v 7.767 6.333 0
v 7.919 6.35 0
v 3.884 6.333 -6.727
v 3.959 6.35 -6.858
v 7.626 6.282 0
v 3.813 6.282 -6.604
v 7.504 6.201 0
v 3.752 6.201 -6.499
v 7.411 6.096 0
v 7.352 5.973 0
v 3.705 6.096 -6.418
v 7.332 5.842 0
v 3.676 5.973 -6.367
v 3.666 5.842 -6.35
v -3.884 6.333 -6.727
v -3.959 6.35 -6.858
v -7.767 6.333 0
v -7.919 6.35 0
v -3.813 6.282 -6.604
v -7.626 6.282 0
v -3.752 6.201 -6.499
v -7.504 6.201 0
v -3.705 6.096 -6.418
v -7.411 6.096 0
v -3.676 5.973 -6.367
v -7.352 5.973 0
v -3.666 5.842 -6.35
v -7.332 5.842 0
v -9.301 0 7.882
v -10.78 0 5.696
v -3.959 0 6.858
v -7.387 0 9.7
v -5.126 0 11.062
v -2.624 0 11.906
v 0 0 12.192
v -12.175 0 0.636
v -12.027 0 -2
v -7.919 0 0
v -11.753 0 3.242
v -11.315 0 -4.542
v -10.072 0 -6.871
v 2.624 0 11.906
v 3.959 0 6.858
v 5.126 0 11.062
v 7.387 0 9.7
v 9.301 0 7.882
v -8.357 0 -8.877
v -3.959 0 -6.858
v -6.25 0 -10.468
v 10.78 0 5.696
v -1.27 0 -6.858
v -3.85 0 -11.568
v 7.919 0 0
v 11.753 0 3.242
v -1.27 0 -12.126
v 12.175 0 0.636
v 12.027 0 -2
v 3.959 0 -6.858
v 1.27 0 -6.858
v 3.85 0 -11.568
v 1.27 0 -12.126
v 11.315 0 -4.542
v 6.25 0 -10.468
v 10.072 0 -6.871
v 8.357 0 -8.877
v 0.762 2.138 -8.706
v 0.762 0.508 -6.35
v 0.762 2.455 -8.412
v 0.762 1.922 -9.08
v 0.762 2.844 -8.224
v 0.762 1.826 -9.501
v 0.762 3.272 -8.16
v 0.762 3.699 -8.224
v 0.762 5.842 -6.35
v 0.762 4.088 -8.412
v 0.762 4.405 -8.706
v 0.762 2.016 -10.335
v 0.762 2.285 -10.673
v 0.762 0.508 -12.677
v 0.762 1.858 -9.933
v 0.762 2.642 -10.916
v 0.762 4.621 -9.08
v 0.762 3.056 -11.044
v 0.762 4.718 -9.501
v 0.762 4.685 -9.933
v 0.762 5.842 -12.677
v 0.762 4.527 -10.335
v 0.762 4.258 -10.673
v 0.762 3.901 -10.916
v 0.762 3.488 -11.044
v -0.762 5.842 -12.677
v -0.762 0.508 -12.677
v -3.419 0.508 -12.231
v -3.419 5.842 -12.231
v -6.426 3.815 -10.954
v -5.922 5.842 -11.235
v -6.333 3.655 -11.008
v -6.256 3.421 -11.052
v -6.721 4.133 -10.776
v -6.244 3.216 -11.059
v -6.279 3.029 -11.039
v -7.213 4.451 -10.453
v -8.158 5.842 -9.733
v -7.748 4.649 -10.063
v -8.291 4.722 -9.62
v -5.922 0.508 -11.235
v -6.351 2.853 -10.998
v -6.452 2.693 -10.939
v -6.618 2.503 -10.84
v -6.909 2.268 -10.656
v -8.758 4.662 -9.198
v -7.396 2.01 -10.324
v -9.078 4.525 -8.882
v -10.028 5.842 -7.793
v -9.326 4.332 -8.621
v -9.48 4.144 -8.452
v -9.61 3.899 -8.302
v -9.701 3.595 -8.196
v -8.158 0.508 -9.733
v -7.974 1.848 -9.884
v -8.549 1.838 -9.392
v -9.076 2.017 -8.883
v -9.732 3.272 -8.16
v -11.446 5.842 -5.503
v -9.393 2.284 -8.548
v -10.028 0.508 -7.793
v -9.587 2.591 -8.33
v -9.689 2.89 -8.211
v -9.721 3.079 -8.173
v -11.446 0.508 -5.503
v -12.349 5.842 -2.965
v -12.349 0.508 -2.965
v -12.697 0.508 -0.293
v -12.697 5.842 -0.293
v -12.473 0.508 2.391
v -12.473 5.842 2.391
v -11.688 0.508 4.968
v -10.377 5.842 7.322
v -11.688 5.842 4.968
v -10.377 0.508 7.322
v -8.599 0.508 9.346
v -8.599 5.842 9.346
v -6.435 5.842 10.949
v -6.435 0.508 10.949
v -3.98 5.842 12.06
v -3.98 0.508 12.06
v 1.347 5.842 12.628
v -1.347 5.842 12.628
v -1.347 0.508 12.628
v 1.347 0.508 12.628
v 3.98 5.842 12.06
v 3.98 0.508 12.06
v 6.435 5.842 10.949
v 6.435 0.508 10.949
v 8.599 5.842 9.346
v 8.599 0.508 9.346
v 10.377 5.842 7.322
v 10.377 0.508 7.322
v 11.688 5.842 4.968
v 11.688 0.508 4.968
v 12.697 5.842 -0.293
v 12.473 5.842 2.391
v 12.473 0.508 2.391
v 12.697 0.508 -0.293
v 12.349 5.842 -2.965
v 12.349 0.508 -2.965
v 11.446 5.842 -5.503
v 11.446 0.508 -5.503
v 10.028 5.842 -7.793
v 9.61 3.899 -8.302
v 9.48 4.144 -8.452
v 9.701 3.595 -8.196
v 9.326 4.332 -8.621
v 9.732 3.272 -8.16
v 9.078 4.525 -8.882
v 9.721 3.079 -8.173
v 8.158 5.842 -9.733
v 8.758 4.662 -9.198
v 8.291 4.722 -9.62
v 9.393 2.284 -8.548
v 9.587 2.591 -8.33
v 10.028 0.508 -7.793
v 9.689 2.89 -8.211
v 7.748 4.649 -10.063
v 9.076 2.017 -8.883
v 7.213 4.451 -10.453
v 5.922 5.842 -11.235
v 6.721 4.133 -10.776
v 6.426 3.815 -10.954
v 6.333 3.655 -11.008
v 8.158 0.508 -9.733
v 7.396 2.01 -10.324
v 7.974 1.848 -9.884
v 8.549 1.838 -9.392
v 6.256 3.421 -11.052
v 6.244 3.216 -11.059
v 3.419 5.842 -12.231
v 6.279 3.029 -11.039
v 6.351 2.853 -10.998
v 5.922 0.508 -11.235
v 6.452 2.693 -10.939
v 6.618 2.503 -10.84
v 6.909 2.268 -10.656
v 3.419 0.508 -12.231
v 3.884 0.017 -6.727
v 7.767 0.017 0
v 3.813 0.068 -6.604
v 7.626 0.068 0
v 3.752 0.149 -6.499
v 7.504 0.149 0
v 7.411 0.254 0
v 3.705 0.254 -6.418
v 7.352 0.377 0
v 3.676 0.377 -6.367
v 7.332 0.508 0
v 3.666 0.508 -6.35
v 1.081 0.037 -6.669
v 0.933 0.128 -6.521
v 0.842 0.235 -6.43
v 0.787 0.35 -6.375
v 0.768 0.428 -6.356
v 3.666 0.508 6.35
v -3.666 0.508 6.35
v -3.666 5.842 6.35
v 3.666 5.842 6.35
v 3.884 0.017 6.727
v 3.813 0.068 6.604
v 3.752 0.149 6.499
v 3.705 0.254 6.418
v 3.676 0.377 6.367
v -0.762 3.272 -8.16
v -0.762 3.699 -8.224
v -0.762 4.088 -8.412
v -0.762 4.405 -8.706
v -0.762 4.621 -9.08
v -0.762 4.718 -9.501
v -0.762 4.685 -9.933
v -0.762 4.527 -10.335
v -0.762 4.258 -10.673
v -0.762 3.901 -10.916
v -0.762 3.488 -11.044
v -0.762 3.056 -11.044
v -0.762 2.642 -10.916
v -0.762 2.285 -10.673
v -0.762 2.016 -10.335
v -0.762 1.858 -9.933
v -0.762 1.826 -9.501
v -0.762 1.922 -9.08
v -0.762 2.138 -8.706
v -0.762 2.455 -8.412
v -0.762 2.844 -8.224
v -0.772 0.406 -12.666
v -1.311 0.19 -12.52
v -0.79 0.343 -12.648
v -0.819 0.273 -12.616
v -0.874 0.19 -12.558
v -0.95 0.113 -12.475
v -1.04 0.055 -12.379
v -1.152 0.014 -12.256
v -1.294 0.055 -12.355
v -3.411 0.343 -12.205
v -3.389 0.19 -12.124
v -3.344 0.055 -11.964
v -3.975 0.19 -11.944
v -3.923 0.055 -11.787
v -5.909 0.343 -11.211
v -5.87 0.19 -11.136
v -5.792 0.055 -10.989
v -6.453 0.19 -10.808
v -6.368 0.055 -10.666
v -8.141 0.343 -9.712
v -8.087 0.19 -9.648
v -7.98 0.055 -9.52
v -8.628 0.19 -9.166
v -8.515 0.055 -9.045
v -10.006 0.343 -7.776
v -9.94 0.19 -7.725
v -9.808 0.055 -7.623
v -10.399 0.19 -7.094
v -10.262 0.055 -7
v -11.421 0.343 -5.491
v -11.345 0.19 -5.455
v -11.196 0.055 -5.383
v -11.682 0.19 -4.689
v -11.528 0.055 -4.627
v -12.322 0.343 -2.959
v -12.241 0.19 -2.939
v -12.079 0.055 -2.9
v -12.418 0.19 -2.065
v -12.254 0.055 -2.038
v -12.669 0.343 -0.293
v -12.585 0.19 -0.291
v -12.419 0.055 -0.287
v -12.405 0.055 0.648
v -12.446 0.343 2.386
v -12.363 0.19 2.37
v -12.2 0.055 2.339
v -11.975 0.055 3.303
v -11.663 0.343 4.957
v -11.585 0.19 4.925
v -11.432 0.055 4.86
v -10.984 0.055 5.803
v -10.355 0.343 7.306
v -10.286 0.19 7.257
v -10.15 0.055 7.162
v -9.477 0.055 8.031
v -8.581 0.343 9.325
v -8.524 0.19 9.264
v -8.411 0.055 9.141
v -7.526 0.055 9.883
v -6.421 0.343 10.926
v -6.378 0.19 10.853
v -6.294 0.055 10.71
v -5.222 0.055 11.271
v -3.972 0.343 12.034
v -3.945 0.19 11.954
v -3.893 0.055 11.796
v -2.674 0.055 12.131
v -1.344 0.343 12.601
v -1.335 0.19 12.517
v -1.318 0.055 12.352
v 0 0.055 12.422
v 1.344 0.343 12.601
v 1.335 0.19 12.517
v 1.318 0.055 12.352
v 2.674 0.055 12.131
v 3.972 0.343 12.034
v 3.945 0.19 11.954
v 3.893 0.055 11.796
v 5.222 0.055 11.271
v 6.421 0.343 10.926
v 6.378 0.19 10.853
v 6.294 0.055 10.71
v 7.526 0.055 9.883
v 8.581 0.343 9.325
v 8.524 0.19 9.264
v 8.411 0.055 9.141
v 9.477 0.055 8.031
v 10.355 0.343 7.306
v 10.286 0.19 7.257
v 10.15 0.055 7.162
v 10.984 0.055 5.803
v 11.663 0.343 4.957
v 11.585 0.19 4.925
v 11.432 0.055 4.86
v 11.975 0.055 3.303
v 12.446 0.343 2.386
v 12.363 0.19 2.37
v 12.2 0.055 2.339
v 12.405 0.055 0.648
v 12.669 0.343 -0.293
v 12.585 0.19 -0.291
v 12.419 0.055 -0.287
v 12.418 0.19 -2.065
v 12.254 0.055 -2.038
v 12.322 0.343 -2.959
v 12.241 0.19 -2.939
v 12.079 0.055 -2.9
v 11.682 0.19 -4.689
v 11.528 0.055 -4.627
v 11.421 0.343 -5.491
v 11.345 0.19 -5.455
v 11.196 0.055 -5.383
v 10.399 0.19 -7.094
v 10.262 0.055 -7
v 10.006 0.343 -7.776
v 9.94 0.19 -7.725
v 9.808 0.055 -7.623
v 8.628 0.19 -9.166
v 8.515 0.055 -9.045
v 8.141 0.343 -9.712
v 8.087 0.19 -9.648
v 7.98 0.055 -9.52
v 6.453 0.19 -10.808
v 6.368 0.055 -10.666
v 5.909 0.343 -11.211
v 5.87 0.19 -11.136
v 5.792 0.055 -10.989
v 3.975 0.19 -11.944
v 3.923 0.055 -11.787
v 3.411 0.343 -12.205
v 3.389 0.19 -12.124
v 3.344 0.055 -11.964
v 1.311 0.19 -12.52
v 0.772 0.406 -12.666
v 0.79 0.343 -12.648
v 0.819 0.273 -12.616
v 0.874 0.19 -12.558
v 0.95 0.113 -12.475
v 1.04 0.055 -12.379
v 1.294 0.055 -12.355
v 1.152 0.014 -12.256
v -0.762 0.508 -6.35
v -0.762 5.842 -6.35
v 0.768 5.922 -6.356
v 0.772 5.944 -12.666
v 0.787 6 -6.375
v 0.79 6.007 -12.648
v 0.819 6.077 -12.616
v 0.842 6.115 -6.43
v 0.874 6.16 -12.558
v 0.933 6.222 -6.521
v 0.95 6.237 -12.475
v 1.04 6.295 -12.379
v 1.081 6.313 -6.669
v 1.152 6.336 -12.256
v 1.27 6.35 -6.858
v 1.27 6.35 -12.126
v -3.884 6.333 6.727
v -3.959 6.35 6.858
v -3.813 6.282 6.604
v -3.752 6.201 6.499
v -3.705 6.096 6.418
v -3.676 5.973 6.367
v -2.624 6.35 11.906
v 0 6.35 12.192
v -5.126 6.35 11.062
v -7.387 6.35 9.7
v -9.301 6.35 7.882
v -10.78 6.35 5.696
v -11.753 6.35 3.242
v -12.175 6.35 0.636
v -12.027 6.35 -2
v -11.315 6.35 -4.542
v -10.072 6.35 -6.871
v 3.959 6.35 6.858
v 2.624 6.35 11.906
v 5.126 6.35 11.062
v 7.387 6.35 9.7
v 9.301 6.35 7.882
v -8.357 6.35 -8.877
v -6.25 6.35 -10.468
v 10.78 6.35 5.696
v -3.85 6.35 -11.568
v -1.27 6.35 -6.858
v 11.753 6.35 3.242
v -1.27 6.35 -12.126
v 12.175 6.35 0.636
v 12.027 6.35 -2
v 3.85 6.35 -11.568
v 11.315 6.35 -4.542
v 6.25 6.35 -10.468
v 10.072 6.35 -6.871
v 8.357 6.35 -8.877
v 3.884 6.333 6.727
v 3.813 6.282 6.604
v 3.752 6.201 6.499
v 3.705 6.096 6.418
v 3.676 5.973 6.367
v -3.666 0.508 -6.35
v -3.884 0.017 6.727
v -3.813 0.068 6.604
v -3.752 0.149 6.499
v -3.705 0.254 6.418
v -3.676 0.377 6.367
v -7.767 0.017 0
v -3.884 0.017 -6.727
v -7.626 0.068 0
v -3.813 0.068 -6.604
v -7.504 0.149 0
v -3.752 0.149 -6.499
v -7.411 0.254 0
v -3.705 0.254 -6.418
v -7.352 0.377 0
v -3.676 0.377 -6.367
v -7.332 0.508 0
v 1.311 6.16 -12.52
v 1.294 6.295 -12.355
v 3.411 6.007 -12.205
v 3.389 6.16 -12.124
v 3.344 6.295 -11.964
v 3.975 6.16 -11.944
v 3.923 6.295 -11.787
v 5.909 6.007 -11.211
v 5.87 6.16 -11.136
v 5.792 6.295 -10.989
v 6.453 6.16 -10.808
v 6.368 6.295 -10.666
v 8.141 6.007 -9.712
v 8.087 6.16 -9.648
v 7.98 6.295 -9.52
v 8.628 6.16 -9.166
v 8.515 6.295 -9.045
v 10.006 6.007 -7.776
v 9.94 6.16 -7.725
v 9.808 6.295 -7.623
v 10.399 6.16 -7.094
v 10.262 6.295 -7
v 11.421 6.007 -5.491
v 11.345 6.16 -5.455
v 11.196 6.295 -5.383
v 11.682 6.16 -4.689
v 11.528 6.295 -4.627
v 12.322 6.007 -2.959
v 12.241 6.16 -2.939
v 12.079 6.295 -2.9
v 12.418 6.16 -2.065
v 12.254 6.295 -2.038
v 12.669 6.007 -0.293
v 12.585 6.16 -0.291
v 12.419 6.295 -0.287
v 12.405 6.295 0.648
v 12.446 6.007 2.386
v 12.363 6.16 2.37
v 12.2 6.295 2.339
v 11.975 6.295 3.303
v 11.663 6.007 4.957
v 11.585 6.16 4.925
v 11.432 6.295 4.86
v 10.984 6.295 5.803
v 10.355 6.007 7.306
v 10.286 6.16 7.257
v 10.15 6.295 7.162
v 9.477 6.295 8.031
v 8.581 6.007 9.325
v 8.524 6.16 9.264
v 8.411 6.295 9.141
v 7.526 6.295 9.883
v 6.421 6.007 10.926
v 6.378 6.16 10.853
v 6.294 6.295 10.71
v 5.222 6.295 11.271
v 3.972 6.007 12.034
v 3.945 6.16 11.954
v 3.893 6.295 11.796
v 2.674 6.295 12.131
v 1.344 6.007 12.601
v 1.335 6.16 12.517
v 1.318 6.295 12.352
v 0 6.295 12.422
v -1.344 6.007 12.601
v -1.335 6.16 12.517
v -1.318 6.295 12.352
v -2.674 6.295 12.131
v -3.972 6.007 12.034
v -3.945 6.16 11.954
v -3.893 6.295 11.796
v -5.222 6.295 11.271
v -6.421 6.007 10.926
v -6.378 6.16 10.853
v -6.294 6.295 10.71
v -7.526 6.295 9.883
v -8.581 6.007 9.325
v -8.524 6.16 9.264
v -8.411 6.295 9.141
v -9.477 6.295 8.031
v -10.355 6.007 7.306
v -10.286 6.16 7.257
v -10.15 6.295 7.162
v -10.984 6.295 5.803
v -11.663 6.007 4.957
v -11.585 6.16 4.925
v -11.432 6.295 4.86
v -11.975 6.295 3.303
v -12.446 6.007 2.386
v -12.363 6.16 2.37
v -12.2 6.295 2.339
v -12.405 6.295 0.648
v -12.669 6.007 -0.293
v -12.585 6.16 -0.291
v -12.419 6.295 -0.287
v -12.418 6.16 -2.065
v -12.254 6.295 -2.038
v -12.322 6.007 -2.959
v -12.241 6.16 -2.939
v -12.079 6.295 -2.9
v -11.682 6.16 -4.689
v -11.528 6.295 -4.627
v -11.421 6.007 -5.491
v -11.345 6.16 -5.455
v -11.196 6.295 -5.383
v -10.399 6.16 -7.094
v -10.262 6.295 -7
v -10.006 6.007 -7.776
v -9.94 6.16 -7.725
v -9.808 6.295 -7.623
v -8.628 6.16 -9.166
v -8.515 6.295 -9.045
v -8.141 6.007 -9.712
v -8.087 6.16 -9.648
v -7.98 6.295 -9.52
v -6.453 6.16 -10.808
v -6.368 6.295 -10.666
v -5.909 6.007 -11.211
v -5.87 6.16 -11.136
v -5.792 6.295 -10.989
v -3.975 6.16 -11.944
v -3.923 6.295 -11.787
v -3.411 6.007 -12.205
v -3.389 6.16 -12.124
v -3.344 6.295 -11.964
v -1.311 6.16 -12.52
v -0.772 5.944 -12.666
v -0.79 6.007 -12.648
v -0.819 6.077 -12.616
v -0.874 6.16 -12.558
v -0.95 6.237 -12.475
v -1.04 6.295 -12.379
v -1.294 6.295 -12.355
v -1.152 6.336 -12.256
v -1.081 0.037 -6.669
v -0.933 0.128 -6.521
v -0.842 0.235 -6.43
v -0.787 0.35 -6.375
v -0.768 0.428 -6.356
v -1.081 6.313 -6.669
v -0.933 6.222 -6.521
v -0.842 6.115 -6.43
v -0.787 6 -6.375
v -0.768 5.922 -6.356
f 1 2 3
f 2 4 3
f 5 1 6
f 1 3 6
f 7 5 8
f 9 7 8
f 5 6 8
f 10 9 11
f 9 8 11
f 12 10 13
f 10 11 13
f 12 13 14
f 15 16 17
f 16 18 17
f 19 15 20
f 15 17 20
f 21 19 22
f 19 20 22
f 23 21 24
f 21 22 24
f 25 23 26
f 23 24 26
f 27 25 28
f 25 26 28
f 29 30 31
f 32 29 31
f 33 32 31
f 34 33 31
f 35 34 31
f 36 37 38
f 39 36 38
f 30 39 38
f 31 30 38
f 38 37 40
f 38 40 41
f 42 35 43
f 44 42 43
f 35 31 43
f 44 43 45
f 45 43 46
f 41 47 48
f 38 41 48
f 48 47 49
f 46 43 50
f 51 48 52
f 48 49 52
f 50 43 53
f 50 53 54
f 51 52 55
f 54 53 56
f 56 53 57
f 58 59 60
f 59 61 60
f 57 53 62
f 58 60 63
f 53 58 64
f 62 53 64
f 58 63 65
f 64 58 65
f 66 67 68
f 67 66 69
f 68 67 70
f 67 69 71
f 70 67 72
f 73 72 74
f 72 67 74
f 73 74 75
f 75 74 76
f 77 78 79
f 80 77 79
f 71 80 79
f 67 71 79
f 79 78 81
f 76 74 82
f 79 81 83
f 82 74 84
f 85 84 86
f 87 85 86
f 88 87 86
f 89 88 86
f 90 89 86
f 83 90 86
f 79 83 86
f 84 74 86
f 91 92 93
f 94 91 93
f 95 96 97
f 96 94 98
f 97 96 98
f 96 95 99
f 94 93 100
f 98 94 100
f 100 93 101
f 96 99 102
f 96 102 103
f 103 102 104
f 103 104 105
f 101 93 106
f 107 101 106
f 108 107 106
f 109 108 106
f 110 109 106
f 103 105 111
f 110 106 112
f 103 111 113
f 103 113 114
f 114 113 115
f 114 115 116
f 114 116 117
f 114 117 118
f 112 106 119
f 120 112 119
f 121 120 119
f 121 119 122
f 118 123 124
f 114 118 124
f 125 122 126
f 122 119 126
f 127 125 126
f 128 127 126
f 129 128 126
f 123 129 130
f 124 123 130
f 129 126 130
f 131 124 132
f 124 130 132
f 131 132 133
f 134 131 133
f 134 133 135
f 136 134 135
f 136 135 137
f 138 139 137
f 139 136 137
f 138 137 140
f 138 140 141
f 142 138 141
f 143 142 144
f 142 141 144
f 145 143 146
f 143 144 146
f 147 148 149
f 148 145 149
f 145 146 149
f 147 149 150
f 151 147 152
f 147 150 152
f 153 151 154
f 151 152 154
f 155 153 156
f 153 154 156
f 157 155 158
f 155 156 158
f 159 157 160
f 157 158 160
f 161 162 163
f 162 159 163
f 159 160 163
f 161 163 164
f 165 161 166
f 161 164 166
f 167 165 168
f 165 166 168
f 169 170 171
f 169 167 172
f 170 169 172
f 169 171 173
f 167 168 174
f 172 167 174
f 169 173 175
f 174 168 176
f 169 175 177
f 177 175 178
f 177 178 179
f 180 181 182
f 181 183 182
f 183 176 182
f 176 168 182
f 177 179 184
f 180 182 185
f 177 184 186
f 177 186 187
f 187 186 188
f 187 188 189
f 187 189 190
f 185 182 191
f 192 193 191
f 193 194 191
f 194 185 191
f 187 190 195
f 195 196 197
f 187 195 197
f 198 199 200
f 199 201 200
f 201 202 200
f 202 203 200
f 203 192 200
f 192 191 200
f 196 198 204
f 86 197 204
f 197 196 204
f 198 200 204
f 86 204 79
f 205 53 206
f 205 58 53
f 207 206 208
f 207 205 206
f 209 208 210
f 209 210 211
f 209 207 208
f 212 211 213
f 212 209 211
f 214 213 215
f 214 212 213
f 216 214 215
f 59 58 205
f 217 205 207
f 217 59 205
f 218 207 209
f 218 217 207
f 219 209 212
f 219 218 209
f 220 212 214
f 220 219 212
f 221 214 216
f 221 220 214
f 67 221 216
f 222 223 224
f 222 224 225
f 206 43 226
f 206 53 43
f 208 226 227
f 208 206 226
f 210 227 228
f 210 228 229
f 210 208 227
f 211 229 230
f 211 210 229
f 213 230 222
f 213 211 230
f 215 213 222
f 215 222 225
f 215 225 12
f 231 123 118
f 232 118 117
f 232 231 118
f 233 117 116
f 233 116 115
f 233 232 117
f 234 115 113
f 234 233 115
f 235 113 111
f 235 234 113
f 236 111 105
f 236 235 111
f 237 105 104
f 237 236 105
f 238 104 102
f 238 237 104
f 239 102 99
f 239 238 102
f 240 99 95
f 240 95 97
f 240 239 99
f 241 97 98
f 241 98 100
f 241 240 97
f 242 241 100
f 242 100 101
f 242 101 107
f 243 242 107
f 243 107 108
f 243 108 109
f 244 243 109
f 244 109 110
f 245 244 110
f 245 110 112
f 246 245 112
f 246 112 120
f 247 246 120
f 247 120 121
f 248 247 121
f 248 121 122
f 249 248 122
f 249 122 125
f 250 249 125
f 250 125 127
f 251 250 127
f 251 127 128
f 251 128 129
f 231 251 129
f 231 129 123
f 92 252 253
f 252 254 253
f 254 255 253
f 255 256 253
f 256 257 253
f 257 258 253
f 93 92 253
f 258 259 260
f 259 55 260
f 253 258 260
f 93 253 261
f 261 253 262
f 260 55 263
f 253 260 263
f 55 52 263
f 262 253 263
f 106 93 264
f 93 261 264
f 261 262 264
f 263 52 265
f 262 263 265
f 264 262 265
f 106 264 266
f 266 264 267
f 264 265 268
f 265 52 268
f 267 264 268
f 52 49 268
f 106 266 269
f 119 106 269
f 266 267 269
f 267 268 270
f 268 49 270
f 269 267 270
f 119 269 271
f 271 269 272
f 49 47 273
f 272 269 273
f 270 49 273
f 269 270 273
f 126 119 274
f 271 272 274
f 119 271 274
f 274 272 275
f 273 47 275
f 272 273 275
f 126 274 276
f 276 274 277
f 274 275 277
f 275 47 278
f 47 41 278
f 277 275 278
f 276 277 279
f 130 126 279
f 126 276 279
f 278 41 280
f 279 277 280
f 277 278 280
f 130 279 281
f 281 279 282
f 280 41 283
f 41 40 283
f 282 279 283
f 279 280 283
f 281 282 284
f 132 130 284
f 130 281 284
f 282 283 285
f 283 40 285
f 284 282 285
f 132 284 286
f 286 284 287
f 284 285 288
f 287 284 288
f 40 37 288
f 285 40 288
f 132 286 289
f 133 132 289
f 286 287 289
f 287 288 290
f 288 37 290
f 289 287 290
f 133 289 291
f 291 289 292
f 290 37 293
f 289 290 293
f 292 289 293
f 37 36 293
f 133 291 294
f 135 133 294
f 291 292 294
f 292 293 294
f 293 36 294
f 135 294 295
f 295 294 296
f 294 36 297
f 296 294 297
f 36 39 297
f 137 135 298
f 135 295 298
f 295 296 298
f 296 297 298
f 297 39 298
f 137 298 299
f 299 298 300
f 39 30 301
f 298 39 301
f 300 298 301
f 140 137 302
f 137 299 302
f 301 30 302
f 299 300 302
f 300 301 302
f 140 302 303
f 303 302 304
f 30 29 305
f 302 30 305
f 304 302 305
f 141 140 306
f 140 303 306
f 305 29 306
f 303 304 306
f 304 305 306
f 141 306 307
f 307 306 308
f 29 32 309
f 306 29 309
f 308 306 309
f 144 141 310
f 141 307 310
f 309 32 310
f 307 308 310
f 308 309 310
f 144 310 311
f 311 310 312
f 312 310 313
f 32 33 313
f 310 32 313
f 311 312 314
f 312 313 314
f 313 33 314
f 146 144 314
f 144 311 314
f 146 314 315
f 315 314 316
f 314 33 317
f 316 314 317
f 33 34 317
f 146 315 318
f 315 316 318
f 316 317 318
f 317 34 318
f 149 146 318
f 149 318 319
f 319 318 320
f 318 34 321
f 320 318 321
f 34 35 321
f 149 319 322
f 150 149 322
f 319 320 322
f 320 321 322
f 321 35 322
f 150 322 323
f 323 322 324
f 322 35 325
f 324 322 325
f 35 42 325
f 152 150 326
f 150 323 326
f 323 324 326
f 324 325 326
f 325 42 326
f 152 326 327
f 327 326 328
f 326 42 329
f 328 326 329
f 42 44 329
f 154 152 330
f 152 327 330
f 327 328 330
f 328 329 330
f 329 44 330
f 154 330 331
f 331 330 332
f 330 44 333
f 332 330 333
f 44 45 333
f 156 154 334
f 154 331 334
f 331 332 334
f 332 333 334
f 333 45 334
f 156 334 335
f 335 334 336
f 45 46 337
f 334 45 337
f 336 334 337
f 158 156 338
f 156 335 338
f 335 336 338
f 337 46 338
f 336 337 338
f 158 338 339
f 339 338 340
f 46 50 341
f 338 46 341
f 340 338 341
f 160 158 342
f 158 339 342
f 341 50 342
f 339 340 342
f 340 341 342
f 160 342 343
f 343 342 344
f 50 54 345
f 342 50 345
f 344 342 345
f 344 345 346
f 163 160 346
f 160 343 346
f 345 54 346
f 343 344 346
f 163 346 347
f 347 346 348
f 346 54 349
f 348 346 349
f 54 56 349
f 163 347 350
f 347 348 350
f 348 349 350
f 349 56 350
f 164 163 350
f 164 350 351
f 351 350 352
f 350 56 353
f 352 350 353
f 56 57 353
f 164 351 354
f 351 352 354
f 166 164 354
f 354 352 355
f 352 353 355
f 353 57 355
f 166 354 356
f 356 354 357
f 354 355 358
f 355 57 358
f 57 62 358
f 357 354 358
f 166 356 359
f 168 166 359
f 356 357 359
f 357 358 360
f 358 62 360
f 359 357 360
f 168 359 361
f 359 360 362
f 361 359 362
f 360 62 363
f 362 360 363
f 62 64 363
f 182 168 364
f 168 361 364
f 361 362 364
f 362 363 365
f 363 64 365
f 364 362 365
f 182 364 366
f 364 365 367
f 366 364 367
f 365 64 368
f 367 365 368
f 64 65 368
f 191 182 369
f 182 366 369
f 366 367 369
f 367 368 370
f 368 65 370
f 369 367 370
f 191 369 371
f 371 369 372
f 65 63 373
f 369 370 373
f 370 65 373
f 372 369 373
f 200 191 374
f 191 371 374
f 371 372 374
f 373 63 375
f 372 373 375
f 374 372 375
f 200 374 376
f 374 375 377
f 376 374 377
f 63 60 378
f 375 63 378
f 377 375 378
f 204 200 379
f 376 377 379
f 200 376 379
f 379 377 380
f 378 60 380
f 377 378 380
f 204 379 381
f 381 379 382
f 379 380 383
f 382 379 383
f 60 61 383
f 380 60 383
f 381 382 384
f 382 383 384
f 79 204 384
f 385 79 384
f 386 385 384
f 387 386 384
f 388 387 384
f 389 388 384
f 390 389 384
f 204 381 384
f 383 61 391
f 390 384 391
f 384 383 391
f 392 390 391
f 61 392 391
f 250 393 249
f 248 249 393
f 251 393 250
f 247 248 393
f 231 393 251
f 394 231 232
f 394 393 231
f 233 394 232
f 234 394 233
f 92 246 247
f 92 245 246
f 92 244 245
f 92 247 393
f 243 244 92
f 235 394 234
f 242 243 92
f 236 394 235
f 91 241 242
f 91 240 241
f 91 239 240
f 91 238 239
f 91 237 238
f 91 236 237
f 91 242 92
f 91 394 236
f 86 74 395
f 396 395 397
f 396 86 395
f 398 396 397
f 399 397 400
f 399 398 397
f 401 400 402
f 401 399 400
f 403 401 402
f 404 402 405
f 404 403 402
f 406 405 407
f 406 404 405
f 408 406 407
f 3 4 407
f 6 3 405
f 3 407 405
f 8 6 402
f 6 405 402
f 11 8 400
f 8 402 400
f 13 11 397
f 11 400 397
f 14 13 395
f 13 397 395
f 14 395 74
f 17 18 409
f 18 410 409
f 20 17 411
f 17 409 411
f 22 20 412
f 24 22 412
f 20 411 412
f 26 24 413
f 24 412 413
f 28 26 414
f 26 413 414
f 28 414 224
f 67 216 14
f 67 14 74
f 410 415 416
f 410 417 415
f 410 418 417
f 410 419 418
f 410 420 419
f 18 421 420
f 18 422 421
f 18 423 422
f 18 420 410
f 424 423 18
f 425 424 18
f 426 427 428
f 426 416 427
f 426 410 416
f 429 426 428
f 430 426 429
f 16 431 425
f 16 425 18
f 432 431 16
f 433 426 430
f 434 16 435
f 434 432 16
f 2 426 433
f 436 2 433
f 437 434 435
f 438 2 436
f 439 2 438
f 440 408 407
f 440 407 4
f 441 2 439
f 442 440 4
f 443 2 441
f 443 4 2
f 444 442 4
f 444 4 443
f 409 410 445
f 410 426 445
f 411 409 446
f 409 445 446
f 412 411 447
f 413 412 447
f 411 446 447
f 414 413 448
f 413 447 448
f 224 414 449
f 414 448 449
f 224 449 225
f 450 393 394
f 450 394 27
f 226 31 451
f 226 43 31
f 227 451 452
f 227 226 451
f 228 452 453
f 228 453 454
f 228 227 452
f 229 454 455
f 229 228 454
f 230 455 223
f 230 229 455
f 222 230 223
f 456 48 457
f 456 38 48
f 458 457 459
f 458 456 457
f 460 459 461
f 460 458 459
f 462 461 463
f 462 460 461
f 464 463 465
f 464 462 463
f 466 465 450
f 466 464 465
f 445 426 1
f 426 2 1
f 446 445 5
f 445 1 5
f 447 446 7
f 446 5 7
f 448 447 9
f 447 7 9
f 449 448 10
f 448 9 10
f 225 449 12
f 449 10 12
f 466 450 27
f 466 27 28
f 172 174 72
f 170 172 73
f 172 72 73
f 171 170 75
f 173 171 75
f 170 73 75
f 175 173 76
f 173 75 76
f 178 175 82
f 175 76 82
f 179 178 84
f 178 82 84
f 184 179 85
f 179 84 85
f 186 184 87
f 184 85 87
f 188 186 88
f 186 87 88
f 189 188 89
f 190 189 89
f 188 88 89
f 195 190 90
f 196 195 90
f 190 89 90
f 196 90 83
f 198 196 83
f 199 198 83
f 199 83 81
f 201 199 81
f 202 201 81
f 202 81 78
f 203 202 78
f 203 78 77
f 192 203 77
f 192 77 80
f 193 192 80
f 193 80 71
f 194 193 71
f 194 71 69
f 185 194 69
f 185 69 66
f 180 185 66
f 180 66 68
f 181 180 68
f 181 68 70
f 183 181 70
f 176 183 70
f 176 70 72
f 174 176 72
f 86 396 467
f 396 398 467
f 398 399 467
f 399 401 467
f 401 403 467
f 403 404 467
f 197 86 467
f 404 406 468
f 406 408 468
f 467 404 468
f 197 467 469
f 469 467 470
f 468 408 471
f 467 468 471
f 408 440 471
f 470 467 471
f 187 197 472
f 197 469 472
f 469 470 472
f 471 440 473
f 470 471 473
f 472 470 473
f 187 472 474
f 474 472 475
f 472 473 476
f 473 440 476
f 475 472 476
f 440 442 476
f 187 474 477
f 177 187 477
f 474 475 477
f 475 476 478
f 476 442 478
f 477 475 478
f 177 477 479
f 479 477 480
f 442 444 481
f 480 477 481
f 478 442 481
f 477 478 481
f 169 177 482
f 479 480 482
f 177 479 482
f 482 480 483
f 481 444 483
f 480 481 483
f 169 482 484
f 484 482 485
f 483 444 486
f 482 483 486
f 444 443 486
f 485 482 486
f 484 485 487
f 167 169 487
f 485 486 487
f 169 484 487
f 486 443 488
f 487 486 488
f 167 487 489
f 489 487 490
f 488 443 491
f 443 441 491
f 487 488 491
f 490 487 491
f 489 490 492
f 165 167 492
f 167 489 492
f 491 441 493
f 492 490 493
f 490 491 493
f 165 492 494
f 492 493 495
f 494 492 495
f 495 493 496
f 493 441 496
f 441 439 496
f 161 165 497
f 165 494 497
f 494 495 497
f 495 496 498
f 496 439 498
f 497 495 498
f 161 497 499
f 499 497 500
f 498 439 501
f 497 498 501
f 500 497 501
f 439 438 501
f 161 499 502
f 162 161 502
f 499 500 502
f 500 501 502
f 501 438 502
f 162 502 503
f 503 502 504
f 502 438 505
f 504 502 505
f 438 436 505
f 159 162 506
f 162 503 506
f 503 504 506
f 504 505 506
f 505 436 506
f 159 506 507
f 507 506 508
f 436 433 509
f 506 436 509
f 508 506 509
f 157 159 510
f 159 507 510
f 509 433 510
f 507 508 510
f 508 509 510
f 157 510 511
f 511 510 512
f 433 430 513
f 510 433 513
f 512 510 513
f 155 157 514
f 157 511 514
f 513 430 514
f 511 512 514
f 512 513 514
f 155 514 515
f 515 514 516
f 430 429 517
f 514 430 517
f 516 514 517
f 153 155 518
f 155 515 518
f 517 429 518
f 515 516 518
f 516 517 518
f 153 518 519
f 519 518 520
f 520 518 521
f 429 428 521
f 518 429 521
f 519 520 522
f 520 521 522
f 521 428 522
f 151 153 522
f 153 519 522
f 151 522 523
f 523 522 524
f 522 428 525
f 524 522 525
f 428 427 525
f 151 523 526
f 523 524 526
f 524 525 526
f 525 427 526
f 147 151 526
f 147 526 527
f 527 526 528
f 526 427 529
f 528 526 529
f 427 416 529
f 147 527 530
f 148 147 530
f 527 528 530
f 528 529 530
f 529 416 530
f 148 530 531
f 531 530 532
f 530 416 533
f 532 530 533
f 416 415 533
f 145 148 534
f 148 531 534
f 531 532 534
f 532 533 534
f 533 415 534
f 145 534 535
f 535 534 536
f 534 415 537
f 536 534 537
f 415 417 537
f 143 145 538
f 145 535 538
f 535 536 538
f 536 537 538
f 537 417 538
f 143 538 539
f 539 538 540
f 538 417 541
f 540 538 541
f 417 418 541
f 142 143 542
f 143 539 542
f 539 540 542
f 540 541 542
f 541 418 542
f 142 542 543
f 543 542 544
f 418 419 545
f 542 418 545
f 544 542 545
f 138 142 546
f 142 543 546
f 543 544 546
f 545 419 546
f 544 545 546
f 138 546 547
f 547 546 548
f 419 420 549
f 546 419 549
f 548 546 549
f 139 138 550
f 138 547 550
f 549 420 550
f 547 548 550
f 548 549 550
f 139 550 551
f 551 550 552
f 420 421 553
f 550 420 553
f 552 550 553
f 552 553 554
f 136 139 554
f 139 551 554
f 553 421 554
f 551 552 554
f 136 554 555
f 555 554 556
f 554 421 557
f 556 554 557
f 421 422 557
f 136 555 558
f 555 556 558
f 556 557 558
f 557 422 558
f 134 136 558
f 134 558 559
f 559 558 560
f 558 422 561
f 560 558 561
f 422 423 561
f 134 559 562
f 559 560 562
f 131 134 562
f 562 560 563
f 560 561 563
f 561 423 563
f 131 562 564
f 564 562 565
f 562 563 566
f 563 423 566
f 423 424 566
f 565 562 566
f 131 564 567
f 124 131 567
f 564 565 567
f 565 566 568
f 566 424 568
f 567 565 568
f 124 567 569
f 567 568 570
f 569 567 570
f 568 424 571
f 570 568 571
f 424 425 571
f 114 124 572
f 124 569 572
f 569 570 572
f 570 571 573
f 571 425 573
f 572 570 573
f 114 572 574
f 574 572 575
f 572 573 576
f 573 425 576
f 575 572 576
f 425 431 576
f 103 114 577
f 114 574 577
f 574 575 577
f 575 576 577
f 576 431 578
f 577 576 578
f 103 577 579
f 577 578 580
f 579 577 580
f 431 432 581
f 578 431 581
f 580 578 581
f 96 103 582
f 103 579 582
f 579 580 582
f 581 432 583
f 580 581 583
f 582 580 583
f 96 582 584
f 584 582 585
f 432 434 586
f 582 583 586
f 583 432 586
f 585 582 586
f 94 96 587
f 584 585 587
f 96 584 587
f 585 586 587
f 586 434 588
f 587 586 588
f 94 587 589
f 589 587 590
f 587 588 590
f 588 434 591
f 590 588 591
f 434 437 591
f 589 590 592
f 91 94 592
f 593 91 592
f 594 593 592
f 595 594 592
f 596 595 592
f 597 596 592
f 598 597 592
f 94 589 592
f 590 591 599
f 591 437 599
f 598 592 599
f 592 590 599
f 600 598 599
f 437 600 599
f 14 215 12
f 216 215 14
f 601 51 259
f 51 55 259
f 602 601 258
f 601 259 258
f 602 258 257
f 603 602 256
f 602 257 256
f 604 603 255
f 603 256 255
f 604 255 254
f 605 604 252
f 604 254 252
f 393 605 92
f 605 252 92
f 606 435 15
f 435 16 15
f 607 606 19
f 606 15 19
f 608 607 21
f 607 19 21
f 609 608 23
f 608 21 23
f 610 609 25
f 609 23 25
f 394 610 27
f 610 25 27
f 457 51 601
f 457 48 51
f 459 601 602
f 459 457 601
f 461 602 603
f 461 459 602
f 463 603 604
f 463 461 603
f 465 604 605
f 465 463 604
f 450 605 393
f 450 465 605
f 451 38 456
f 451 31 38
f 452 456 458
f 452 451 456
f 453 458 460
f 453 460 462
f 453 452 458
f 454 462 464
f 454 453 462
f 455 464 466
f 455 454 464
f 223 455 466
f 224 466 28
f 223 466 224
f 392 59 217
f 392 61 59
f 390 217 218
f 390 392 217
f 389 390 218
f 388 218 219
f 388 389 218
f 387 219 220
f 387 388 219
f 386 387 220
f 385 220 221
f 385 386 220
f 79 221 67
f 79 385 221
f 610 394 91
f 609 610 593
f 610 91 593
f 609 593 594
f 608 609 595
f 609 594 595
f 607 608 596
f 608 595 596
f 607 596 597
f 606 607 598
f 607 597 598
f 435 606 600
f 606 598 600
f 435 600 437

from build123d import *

# Parameters (mm, degrees)
SKETCH1_R               = 12.7
BOSS_EXTRUDE1_DEPTH     = 6.35
SKETCH2_W               = 16.521892969
SKETCH2_H               = 16.064378343
CUT_EXTRUDE1_DEPTH      = 0.762
CUT_EXTRUDE1_DEPTH_BACK = 0.762
SKETCH3_R               = 1.450011988
CUT_EXTRUDE2_DEPTH      = 14.462
CUT_EXTRUDE2_DEPTH_BACK = 12.938
FILLET1_R               = 0.508


with BuildPart() as part:
    # Sketch1 → Boss-Extrude1 (new body)
    with BuildSketch(Plane(origin=(0, 0, 0), x_dir=(1, 0, 0), z_dir=(0, 1, 0))):
        Circle(SKETCH1_R)
        Polygon((7.332348419, 0), (3.666174209, 6.35), (-3.666174209, 6.35), (-7.332348419, 0), (-3.666174209, -6.35), (3.666174209, -6.35), align=None, mode=Mode.SUBTRACT)
    extrude(amount=BOSS_EXTRUDE1_DEPTH)

    # Sketch2 → Cut-Extrude1 (cut, two sides)
    with BuildSketch(Plane(origin=(0, 0, 0), x_dir=(0, 0, -1), z_dir=(1, 0, 0))) as cut_extrude1_sk:
        with Locations((10.843461422, 3.411156181)):
            Rectangle(SKETCH2_W, SKETCH2_H)
    extrude(amount=CUT_EXTRUDE1_DEPTH, mode=Mode.SUBTRACT)
    extrude(cut_extrude1_sk.sketch, amount=-CUT_EXTRUDE1_DEPTH_BACK, mode=Mode.SUBTRACT)

    # Sketch3 → Cut-Extrude2 (cut, two sides)
    with BuildSketch(Plane.ZY.offset(-0.762)) as cut_extrude2_sk:
        with Locations((-9.609846494, 3.271635)):
            Circle(SKETCH3_R)
    extrude(amount=CUT_EXTRUDE2_DEPTH, mode=Mode.SUBTRACT)
    extrude(cut_extrude2_sk.sketch, amount=-CUT_EXTRUDE2_DEPTH_BACK, mode=Mode.SUBTRACT)

    # Fillet1
    fillet1_edges = [part.edges().sort_by_distance(p)[0] for p in [
        (2.214087105, 0, -6.35),
        (-5.499261314, 0, -3.175),
        (-5.499261314, 0, 3.175),
        (0, 0, 6.35),
        (5.499261314, 6.35, 3.175),
        (5.499261314, 6.35, -3.175),
        (2.214087105, 6.35, -6.35),
        (-5.499261314, 6.35, -3.175),
        (-5.499261314, 6.35, 3.175),
        (0, 6.35, 6.35),
        (-2.214087105, 0, -6.35),
        (-2.214087105, 6.35, -6.35),
        (-8.706681343, 6.35, 9.245739559),
        (-8.706681343, 0, 9.245739559),
        (0.762, 0, -9.513559694),
        (-0.762, 6.35, -9.513559694),
        (0.762, 6.35, -9.513559694),
        (-0.762, 0, -9.513559694),
        (5.499261314, 0, 3.175),
        (5.499261314, 0, -3.175),
    ]]
    fillet(fillet1_edges, radius=FILLET1_R)


solid = part.part
